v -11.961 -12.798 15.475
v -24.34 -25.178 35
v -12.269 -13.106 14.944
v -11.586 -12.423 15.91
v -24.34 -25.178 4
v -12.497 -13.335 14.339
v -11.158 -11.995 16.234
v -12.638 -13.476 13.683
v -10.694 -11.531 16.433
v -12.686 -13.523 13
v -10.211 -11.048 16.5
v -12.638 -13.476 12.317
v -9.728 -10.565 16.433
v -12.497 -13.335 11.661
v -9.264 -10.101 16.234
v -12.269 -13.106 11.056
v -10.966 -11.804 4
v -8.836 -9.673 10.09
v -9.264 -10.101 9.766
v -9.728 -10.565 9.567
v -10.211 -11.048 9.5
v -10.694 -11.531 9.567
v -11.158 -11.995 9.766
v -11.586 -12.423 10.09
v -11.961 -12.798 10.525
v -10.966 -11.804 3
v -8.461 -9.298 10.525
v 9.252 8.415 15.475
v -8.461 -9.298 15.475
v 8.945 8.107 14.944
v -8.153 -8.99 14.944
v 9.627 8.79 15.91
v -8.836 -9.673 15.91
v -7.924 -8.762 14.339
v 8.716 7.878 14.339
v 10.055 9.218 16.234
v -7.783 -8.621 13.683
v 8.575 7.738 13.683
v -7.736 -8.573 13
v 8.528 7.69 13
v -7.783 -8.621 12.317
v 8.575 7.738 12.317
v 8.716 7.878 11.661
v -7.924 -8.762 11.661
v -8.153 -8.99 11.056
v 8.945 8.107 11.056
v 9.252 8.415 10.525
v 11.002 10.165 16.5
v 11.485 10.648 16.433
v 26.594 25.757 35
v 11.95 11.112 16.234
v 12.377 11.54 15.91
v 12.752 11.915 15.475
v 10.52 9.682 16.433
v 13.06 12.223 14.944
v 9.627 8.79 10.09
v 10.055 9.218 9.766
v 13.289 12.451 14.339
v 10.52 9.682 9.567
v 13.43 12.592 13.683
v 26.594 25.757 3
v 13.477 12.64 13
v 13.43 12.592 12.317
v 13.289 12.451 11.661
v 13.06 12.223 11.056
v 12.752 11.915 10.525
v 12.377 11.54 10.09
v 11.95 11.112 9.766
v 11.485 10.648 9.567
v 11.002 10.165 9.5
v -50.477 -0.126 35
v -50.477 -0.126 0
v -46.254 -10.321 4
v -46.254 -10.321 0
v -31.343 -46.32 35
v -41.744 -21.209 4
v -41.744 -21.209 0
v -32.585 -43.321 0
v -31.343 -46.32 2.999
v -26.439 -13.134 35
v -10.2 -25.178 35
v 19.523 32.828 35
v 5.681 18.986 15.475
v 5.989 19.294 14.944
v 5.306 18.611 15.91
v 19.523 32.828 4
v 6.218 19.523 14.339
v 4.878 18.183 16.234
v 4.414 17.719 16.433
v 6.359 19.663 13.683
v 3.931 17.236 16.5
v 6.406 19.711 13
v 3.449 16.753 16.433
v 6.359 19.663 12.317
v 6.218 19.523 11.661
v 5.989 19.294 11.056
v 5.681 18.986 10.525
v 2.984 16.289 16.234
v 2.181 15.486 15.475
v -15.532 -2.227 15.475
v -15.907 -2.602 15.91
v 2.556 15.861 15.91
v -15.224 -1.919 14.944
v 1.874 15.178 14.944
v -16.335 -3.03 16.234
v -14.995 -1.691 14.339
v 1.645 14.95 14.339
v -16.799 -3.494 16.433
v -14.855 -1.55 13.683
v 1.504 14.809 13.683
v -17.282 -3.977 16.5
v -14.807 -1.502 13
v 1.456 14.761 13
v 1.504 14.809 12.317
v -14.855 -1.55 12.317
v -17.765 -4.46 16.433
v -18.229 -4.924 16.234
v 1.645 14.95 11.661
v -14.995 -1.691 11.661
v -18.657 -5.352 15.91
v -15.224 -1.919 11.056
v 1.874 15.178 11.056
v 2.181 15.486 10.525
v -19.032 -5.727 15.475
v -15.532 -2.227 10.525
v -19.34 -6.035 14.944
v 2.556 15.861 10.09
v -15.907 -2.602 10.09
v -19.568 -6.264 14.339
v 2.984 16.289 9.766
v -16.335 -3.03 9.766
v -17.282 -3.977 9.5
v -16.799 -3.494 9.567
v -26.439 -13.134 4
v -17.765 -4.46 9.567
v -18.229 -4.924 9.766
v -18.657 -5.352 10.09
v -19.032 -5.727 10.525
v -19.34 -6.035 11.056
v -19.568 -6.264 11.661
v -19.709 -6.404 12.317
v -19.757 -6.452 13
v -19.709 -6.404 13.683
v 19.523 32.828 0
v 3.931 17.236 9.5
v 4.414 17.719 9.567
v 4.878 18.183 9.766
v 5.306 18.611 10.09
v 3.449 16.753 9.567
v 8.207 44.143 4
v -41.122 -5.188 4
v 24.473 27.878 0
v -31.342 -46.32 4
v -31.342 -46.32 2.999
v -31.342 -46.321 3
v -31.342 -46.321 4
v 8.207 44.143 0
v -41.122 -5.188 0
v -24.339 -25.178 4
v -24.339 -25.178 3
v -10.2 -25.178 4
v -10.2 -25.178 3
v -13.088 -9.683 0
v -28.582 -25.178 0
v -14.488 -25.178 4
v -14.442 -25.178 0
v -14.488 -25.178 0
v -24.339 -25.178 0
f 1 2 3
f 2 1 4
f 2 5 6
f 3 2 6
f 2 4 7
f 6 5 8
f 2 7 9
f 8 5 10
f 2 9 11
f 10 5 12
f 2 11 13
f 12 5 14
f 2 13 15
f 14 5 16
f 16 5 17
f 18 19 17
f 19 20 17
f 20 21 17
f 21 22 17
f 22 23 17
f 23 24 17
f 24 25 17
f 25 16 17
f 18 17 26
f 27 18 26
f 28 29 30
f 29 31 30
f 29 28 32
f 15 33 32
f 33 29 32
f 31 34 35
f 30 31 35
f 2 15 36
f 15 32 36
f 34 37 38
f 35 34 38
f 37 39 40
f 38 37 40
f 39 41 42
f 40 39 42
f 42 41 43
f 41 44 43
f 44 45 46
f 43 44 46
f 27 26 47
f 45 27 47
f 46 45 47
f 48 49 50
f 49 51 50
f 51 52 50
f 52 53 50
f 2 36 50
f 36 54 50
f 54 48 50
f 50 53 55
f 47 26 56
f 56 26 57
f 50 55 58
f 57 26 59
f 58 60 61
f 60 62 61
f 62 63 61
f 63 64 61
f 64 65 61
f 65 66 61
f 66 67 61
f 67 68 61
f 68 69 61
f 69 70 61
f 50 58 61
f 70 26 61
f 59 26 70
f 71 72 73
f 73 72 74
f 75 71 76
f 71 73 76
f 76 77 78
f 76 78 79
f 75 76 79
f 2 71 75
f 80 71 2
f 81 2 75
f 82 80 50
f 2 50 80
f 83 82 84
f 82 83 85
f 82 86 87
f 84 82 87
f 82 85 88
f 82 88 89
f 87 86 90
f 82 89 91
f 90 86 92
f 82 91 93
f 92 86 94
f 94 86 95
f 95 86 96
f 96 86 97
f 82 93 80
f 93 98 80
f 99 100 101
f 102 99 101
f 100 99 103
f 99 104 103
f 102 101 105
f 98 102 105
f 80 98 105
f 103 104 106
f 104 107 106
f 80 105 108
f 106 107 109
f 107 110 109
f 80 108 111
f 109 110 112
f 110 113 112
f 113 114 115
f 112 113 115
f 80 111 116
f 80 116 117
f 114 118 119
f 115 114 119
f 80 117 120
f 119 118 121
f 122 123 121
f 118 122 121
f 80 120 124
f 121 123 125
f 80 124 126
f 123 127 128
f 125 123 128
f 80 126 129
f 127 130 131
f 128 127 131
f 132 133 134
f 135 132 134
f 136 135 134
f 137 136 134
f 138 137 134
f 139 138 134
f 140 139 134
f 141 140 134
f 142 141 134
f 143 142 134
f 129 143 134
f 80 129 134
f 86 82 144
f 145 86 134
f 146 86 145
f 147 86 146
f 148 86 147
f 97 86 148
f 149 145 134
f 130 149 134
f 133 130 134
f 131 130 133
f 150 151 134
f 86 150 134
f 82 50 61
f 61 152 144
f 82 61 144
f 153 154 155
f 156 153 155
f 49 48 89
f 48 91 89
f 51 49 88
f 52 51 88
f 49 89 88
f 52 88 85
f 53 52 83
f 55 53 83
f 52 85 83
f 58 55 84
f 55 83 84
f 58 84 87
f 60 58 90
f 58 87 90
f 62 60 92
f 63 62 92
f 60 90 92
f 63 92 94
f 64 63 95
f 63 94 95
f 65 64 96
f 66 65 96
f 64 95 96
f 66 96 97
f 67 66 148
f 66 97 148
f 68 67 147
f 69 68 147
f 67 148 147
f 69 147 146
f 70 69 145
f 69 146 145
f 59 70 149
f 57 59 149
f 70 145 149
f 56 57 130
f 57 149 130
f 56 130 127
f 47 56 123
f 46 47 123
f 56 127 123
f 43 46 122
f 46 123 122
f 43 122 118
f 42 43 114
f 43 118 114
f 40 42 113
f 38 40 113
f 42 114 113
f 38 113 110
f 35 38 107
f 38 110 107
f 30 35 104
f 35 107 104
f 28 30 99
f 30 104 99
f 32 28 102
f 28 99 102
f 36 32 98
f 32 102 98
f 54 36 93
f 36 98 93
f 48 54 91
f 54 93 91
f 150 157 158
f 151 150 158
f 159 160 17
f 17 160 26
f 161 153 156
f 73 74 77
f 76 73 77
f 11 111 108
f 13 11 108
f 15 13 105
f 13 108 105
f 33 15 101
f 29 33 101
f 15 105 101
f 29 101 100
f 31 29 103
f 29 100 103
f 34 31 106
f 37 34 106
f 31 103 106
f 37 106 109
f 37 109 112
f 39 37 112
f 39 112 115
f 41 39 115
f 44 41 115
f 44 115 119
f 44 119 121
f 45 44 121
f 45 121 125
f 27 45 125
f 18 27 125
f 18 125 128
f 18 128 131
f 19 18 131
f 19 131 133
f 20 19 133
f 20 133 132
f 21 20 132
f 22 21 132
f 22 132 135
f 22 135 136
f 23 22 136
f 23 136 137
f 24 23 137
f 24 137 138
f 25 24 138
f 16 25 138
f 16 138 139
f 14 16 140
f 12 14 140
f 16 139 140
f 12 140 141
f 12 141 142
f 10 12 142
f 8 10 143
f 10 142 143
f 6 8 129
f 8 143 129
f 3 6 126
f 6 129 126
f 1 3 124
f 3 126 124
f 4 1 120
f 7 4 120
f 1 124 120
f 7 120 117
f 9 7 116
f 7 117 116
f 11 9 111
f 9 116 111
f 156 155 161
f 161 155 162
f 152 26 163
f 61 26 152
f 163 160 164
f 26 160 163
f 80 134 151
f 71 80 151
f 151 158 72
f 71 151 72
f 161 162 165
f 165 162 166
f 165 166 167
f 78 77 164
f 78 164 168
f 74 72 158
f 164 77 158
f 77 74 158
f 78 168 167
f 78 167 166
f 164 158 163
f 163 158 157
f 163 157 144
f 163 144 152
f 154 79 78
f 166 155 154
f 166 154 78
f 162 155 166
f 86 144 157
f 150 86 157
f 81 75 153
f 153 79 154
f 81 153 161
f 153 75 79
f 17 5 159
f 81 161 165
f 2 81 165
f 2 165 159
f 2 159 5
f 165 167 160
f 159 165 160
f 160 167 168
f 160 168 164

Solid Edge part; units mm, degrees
sketch "Sketch1" plane through (0, 0, 0) normal (0, 0, 1) x (1, 0, 0)
  line L0 (-50.4769, -0.1262) -> (-31.3427, -46.3202)
  line L1 (-31.3427, -46.3202) -> (-10.2002, -25.1777)
  line L2 (-10.2002, -25.1777) -> (-24.3402, -25.1777)
  line L3 (-24.3402, -25.1777) -> (26.5942, 25.7567)
  line L4 (26.5942, 25.7567) -> (19.5231, 32.8278)
  line L5 (19.5231, 32.8278) -> (-26.4388, -13.1341)
  line L6 (-26.4388, -13.1341) -> (-50.4769, -0.1262)
  dimension "D1" = 50
  dimension "D2" = 29.9
  dimension "D3" = 10
  dimension "D4" = 65
  dimension "D5" = 14.14
  dimension "D6" = 70
extrude "Protrusion1" add sketch "Sketch1" along normal blind 35
sketch "Sketch2" plane through (-12.0121, -6.8169, 0) normal (0, 0, -1) x (-0.8795, 0.4759, 0)
  line L0 (-1.7996, -43.9425) -> (-10.3318, -15.2857)
  line L1 (-10.3318, -15.2857) -> (2.1041, -22.0153)
  line L2 (2.1041, -22.0153) -> (-18.451, 47.0217)
  line L3 (-18.451, 47.0217) -> (6.4693, 54.4415)
  line L4 (6.4693, 54.4415) -> (28.4484, -19.3779)
  line L5 (28.4484, -19.3779) -> (-1.7996, -43.9425)
  dimension "D1" = 36
extrude "Extrusionsausprägung_6" add sketch "Sketch2" against normal blind 4
sketch "Sketch3" plane through (-3.4579, 9.8468, 19.5) normal (-0.7071, 0.7071, 0) x (0, 0, 1)
  circle A0 centre (-6.5, 10.45) radius 3.5
  circle A1 centre (-6.5, -19.55) radius 3.5
  dimension "D1" = 7
  dimension "D2" = 22.05
  dimension "D3" = 13
  dimension "D4" = 30
extrude "Cutout1" cut sketch "Sketch3" against normal through all
chamfer "Fase_3" distance 3 angle 45 2 edges at (-20.7715, -35.7489, 0) (1.127, 0.2895, 0)
properties material "Nylon, allgemein"
